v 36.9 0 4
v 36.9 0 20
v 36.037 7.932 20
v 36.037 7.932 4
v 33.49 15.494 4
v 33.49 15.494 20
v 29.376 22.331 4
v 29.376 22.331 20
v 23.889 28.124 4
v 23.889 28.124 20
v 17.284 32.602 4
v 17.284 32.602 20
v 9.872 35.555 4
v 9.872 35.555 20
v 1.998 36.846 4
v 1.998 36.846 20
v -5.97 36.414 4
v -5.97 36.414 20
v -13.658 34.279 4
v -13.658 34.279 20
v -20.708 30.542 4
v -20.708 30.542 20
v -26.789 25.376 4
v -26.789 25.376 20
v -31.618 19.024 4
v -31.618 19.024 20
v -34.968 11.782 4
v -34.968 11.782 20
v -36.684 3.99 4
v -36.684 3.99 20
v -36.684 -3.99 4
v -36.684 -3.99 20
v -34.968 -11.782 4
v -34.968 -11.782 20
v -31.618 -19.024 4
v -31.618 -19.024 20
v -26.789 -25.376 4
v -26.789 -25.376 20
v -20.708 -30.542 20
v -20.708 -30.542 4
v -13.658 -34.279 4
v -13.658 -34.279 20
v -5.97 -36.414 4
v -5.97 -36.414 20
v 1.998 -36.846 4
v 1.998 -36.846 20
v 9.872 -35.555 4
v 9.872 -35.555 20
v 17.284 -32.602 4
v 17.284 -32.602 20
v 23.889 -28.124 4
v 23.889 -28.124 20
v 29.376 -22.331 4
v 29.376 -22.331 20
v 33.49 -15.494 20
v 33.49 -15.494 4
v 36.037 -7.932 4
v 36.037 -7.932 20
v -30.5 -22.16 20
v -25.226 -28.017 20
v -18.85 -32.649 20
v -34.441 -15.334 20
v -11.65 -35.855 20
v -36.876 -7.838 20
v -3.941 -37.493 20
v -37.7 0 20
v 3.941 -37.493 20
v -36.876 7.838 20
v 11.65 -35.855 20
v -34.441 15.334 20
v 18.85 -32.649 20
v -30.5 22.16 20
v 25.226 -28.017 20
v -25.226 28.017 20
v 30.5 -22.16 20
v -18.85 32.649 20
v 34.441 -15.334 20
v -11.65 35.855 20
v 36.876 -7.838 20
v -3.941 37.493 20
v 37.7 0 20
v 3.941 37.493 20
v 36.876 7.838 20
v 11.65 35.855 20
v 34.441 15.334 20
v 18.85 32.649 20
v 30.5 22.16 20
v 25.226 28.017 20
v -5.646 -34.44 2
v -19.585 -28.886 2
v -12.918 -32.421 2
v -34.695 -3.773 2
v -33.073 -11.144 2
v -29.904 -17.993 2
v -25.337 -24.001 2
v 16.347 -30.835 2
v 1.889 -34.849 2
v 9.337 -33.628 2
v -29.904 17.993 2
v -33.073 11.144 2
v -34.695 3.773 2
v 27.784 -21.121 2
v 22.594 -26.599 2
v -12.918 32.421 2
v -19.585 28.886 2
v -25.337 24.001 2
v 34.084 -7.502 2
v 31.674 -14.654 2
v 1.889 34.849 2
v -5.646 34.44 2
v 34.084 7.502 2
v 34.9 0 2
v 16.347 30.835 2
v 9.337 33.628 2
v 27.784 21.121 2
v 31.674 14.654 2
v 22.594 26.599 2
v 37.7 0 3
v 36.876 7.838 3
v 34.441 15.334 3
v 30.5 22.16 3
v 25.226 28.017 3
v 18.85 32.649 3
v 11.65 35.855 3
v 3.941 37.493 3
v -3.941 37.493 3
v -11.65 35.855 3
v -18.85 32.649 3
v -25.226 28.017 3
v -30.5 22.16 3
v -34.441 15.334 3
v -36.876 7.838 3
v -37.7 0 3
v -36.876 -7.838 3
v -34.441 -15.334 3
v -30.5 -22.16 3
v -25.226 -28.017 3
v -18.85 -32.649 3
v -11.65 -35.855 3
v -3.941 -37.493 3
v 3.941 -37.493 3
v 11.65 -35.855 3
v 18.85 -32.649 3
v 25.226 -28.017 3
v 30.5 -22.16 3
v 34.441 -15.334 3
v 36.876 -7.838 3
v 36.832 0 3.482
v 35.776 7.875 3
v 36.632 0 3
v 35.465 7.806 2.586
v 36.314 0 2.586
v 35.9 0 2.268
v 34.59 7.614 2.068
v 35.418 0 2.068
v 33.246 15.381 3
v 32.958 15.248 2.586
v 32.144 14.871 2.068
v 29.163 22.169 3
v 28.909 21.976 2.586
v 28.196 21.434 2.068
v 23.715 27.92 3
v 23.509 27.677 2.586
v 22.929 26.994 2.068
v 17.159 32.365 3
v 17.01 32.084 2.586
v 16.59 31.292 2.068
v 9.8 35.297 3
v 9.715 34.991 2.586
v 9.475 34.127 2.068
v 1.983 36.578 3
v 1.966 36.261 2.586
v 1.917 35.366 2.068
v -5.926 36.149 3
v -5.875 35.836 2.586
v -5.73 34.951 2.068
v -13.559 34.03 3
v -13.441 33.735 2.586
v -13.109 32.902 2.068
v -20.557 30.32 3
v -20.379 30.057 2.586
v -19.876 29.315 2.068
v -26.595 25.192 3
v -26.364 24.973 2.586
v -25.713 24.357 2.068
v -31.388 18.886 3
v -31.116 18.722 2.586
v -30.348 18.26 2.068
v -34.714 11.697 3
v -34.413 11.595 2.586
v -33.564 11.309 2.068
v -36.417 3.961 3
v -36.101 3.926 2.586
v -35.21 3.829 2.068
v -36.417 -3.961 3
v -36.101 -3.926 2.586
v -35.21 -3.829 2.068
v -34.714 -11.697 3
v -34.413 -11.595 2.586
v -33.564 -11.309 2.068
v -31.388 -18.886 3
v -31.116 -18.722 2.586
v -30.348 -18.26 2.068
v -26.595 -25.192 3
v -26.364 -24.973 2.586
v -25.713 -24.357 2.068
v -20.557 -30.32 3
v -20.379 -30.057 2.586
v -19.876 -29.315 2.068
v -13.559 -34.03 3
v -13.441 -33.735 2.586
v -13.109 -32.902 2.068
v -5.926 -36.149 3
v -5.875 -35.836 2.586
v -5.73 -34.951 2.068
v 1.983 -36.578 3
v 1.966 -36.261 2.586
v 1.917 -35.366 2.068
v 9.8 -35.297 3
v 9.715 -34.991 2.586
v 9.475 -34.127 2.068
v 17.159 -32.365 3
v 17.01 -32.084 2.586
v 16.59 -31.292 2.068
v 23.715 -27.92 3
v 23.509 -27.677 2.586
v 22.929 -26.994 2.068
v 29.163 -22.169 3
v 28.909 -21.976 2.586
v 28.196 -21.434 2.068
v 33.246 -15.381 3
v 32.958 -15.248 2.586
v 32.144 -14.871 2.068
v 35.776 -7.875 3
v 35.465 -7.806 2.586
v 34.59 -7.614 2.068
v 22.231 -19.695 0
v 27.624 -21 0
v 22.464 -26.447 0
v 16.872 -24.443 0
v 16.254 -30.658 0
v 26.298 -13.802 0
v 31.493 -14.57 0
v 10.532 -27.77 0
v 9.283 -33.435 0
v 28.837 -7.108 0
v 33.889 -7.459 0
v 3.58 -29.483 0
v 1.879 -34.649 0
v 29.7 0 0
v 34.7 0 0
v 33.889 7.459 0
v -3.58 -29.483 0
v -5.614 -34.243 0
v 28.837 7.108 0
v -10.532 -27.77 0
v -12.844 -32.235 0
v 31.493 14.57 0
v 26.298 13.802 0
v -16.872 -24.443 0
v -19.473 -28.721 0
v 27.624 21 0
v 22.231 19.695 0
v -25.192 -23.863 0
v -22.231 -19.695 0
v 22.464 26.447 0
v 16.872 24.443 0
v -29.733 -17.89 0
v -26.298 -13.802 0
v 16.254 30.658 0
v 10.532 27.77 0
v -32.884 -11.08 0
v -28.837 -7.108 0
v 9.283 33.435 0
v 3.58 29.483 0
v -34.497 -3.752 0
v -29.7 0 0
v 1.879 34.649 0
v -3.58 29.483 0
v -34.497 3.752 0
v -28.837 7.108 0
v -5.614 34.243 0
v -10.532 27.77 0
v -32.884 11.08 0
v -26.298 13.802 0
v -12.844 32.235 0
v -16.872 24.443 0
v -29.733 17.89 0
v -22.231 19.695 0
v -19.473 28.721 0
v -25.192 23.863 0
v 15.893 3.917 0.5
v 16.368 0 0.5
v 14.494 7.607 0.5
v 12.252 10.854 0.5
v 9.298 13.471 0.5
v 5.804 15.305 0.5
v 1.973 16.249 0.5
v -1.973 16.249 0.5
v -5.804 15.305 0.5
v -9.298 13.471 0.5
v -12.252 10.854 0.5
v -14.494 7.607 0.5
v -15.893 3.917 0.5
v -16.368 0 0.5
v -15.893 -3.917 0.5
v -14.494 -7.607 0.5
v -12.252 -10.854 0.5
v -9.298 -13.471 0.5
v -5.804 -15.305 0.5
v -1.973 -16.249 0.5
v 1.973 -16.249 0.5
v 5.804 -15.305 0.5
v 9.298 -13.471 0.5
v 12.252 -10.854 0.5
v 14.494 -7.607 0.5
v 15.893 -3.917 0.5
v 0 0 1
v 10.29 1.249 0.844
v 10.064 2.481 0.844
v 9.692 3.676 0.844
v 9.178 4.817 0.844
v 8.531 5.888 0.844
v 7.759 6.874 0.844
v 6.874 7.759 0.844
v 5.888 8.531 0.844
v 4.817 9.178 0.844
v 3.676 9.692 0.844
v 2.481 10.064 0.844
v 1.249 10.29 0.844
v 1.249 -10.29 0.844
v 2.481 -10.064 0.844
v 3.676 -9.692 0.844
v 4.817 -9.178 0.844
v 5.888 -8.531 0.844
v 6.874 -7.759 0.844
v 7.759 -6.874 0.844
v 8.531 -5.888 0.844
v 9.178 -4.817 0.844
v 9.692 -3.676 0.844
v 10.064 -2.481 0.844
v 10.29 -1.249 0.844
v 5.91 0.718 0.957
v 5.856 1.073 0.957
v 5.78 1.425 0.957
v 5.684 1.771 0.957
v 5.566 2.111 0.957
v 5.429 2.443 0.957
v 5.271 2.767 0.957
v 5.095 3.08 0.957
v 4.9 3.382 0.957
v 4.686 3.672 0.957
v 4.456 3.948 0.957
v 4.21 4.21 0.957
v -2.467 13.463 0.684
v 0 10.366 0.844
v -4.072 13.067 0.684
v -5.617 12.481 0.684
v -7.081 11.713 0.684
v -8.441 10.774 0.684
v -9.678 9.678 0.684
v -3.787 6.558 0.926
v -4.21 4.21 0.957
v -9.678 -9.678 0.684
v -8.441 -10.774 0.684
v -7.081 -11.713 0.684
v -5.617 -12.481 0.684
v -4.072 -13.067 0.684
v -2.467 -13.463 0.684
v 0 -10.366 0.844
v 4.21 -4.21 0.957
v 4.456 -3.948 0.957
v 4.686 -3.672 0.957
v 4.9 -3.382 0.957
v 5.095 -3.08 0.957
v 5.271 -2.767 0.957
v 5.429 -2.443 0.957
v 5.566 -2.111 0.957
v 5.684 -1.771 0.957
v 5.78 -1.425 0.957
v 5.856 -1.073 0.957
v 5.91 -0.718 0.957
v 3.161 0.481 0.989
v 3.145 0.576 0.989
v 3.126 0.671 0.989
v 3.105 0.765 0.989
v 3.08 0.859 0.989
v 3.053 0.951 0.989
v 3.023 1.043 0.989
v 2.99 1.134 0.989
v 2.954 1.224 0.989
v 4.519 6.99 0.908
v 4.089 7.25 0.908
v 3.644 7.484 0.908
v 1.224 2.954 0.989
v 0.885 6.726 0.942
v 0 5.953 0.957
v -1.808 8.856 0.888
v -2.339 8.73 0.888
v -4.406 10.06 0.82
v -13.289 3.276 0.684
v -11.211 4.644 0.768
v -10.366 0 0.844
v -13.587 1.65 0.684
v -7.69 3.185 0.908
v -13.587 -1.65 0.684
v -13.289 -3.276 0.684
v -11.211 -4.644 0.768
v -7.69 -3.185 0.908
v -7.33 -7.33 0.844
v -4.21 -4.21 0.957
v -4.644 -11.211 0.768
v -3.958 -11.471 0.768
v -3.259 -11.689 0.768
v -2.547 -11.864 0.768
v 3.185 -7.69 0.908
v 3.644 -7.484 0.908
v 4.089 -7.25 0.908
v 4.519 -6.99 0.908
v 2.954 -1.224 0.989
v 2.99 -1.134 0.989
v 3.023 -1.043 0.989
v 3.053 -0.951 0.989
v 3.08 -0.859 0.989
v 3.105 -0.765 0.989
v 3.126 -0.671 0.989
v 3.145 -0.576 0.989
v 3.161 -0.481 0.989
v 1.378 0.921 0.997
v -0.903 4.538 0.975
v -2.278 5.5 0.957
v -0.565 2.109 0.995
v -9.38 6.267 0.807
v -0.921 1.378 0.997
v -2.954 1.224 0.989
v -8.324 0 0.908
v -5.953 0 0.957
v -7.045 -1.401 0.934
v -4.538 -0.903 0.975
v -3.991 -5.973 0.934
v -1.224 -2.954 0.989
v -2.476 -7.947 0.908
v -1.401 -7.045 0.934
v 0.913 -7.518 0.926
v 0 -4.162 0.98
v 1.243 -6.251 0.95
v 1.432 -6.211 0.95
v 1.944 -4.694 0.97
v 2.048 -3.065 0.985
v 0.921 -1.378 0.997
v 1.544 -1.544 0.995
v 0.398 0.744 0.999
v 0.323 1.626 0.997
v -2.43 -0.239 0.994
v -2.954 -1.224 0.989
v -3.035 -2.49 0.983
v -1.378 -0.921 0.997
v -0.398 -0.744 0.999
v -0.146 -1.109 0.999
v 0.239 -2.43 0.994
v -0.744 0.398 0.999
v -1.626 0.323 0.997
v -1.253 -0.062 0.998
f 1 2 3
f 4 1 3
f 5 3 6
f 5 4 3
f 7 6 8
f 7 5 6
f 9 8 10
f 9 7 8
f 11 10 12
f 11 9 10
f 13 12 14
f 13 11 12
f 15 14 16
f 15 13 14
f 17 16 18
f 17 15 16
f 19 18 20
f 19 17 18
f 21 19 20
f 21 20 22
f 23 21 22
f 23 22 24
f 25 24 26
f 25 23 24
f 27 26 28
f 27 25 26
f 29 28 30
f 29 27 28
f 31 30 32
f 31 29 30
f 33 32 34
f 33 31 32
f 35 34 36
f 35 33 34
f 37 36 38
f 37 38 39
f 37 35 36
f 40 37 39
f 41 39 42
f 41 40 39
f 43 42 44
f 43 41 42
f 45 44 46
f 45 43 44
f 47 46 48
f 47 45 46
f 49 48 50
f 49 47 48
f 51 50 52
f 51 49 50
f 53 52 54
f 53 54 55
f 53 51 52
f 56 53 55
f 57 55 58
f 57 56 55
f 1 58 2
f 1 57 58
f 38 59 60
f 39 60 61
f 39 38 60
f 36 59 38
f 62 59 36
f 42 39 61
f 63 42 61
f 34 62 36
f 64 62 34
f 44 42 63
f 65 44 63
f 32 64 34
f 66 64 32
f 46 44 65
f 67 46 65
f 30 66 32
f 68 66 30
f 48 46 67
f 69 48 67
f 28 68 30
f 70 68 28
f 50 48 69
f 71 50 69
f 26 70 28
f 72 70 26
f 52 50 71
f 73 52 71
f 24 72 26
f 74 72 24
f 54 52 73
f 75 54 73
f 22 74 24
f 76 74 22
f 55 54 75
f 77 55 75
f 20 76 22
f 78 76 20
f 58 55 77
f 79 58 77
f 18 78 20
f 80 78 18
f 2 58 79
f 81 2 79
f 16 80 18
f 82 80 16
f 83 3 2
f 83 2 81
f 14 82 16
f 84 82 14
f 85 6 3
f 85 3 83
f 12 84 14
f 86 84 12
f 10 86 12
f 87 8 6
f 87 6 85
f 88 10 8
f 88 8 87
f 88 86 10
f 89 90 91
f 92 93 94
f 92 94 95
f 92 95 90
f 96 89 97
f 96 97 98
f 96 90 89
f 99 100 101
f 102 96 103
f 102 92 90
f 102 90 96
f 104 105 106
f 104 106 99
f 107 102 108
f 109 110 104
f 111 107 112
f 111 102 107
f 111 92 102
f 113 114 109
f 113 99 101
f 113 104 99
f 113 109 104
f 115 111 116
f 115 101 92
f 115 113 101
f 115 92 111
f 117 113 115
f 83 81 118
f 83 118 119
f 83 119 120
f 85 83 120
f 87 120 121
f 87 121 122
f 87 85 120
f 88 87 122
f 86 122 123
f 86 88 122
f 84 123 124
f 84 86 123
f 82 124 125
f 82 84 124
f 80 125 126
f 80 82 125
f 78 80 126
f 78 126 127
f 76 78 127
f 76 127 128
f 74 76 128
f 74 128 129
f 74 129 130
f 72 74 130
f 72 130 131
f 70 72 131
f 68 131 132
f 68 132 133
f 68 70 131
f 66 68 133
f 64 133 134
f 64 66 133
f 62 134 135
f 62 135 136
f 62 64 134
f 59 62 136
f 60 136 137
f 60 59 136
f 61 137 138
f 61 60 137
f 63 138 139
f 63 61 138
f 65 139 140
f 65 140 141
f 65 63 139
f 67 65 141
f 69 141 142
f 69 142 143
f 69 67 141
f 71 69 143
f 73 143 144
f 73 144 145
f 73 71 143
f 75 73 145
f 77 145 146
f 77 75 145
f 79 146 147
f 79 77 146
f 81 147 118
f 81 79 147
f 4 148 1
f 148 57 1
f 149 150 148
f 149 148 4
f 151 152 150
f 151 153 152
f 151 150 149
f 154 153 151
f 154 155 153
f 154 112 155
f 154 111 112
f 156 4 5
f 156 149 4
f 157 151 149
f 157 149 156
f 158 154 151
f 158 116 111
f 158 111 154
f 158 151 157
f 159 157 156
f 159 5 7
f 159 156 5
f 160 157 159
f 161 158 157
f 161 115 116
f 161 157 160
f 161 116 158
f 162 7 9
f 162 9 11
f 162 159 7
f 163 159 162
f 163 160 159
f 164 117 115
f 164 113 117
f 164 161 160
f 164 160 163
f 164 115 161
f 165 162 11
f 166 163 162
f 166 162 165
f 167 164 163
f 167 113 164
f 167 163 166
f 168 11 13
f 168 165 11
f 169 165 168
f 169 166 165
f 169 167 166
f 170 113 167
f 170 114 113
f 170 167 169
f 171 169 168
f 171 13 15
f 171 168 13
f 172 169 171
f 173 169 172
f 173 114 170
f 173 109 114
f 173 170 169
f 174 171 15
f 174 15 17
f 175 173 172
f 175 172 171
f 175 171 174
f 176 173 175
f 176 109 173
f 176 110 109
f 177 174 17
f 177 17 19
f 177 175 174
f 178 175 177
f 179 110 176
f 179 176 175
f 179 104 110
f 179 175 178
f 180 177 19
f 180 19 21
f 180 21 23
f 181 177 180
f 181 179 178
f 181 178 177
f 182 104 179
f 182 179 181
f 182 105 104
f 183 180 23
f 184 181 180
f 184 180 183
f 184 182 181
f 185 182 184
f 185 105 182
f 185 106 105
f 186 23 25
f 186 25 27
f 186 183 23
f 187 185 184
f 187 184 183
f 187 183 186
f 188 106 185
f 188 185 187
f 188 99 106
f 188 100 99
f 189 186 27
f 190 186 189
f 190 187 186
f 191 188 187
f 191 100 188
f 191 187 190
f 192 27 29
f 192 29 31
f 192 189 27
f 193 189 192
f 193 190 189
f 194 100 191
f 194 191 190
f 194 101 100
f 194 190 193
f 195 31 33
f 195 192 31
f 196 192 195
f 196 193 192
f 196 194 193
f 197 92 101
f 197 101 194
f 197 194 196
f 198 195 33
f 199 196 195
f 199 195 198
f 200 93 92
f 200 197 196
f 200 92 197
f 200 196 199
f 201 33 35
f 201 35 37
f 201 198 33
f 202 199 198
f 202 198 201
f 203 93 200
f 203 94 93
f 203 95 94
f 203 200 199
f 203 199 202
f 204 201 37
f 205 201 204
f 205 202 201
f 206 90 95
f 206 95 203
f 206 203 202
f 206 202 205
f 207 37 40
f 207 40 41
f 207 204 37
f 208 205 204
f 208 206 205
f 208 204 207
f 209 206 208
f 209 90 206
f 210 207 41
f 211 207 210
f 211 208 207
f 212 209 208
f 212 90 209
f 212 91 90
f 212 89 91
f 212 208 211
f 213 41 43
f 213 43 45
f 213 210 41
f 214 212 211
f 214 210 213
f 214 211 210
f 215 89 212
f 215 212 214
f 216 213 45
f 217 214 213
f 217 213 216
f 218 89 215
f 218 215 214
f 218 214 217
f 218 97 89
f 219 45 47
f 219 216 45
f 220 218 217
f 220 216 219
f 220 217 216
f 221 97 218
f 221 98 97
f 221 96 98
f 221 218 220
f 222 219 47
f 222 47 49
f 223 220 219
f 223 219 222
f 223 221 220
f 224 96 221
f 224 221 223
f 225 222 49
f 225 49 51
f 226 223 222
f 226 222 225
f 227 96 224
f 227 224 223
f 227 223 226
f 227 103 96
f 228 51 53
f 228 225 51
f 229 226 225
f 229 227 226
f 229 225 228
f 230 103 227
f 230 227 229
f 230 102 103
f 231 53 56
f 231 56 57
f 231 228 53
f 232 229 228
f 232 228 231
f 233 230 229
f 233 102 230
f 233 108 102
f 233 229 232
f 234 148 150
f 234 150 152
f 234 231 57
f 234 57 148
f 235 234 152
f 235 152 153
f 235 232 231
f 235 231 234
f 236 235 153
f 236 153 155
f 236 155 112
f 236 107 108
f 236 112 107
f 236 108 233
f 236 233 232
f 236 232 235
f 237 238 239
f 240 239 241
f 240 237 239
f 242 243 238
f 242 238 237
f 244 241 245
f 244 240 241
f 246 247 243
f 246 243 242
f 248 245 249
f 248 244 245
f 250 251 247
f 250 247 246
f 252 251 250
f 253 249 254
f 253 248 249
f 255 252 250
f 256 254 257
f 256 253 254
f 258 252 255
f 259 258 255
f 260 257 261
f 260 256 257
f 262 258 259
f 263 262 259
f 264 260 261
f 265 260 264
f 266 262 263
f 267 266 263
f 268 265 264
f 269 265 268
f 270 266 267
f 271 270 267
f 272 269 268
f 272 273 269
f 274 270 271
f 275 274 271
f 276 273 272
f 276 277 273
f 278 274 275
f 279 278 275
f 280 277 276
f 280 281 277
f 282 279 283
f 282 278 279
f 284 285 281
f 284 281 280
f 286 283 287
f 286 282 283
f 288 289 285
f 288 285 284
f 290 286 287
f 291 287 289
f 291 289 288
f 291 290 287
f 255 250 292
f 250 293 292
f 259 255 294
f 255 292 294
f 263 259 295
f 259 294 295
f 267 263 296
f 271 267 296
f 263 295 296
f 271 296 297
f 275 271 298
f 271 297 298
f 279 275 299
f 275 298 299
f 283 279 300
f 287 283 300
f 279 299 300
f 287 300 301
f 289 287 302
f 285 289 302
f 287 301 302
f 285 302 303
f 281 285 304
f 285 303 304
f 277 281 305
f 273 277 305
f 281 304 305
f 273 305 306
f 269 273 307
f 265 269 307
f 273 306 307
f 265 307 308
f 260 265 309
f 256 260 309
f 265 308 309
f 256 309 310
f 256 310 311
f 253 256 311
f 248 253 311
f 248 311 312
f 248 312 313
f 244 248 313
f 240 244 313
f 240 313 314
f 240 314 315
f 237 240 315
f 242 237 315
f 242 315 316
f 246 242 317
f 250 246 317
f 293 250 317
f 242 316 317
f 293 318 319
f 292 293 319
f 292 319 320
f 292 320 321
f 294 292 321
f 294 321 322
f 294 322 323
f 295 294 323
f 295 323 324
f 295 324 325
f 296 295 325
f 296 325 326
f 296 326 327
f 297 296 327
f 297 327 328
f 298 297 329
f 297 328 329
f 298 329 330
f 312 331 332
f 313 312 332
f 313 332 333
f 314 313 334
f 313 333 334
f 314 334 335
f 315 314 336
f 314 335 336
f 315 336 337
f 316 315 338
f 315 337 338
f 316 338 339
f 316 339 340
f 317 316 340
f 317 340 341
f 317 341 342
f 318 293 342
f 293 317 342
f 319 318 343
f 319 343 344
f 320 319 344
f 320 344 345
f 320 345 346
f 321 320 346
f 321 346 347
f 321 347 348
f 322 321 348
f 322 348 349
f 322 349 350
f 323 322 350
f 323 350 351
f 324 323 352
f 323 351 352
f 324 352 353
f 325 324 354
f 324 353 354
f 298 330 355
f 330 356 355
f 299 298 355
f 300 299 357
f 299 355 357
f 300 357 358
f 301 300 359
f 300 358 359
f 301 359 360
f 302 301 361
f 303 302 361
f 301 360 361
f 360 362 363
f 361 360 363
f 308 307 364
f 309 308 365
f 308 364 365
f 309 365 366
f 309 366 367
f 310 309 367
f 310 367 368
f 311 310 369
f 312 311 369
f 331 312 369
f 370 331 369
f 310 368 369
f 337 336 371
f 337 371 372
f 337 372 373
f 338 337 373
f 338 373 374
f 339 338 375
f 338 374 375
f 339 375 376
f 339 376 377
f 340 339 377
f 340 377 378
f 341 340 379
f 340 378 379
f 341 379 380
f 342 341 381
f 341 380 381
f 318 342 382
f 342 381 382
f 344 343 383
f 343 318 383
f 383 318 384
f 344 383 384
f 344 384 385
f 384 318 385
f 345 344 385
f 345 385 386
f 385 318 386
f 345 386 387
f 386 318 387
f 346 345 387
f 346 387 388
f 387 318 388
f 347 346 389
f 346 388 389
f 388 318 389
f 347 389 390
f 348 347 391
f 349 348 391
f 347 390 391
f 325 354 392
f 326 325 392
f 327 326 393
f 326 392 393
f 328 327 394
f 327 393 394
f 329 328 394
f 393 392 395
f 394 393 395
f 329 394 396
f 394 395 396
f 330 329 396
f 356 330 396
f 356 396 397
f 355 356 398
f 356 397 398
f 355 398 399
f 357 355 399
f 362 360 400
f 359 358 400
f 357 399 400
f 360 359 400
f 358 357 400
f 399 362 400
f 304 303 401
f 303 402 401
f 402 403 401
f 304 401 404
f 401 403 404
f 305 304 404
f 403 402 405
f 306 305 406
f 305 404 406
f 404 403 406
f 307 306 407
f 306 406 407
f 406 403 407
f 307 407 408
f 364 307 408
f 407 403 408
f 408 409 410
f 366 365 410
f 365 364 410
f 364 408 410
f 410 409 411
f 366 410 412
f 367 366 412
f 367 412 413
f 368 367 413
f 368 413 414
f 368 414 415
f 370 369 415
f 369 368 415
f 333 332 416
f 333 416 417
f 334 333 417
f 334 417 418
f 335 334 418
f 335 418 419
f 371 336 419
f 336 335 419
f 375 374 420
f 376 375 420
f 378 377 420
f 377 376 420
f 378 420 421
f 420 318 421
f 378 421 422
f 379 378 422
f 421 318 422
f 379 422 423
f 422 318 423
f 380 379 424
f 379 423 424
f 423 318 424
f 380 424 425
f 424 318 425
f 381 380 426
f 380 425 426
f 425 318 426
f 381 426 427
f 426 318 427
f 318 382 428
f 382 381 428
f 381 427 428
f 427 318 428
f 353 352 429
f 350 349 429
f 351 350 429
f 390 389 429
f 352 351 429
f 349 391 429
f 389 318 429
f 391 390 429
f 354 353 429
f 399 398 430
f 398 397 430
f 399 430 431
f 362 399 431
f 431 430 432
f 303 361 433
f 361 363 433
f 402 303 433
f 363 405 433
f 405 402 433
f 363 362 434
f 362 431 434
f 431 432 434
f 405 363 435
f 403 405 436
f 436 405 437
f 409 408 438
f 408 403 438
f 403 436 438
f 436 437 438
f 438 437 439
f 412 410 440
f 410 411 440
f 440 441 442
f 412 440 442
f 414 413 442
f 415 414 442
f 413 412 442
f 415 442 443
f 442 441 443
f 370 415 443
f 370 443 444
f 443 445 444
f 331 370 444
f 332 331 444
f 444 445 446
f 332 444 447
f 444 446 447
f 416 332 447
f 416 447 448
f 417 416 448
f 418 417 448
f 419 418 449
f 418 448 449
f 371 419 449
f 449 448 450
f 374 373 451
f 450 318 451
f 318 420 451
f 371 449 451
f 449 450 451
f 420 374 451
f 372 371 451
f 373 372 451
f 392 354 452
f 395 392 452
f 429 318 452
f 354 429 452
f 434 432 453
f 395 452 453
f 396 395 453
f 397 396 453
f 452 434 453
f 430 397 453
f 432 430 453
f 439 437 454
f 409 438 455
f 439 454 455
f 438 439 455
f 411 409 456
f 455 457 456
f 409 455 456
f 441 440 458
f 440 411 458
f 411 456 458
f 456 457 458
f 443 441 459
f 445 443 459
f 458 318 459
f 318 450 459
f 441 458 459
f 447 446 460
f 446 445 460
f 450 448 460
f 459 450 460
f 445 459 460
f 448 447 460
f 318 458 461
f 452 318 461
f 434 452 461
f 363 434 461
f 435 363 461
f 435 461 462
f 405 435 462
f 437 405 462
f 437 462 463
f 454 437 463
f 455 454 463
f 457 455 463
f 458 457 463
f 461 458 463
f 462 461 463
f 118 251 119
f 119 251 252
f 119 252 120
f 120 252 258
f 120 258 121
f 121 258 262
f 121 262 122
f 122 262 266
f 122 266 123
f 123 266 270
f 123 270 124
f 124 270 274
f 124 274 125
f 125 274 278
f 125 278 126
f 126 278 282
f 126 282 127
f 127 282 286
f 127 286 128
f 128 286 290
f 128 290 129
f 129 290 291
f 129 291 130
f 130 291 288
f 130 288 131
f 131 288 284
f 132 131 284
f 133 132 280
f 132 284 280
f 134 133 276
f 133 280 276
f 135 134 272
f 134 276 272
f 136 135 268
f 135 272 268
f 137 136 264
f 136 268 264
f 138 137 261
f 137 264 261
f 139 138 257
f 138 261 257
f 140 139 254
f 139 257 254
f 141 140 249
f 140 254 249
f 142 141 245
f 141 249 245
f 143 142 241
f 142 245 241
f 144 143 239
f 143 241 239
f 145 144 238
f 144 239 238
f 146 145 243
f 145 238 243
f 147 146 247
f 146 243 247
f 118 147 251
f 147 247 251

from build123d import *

# Parameters (mm, degrees)
F2_R    = 2
F3_SIZE = 3


with BuildPart() as f1:
    # F0 (on Front) → F1 (revolve)
    with BuildSketch(Plane.XZ):
        with BuildLine():
            Line((36.9, 20), (36.9, 2))
            Line((36.9, 2), (0, 2))
            Line((0, 2), (0, 1))
            add(Edge.make_bspline(
                [(29.7, 0), (15.418199, 0), (18.330893, 1), (0, 1)],
                knots=[0, 0, 0, 0, 29.71683, 29.71683, 29.71683, 29.71683], degree=3))
            Line((29.7, 0), (37.7, 0))
            Line((37.7, 0), (37.7, 20))
            Line((37.7, 20), (36.9, 20))
        make_face()
    revolve(axis=Axis((0, 0, 19.229219), (0, 0, 1)))

    # F2
    f2_edges = [f1.edges().sort_by_distance(p)[0] for p in [
        (-36.9, 0, 2),
    ]]
    fillet(f2_edges, radius=F2_R)

    # F3
    f3_edges = [f1.edges().sort_by_distance(p)[0] for p in [
        (-37.7, 0, 0),
    ]]
    chamfer(f3_edges, length=F3_SIZE)


solid = f1.part
